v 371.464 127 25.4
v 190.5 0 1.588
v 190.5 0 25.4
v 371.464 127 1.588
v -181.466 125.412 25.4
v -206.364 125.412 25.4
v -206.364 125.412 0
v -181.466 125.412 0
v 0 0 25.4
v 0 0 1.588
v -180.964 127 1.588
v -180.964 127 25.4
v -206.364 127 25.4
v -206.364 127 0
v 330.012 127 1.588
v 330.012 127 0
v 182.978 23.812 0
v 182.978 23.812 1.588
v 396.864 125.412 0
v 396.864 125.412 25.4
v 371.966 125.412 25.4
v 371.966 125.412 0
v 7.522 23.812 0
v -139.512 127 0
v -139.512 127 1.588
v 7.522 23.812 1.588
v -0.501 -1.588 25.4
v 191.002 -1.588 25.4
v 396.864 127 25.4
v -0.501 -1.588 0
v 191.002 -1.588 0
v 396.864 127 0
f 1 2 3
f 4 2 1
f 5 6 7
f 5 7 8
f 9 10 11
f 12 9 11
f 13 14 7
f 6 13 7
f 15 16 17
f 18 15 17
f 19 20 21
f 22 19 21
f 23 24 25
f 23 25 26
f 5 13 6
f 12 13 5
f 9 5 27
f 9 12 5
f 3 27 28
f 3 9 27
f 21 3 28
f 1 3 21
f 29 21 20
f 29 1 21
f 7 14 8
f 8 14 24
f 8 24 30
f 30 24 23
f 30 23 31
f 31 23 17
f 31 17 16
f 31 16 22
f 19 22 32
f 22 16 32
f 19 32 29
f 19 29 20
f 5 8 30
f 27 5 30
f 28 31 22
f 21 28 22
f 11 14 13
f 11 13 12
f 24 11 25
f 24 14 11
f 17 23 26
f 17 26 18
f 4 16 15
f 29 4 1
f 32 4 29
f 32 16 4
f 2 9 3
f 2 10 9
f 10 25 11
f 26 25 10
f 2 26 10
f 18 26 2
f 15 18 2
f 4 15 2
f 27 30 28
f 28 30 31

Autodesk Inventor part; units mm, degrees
ref_plane "YZ Plane" through (0, 0, 0) normal (1, 0, 0) x (0, 1, 0)
ref_plane "XZ Plane" through (0, 0, 0) normal (0, 1, 0) x (-1, 0, 0)
ref_plane "XY Plane" through (0, 0, 0) normal (0, 0, 1) x (1, 0, 0)
sketch "Sketch1" plane through (0, 0, 0) normal (0, 0, 1) x (1, 0, 0)
  line L0 (0, 0) -> (190.5, 0)
  line L1 (7.522, 23.8125) -> (182.978, 23.8125)
  line L2 (0, 0) -> (-180.9643, 127)
  line L3 (190.5, 0) -> (371.4643, 127)
  line L4 (-139.5115, 127) -> (7.522, 23.8125)
  line L5 (330.0115, 127) -> (182.978, 23.8125)
  line L6 (-180.9643, 127) -> (-139.5115, 127)
  line L7 (330.0115, 127) -> (371.4643, 127)
  line L8 (-181.4658, 125.4125) -> (-0.5015, -1.5875)
  line L9 (-0.5015, -1.5875) -> (191.0015, -1.5875)
  line L10 (191.0015, -1.5875) -> (371.9658, 125.4125)
  line L11 (-180.9643, 127) -> (-206.3643, 127)
  line L12 (-206.3643, 127) -> (-206.3643, 125.4125)
  line L13 (-206.3643, 125.4125) -> (-181.4658, 125.4125)
  line L14 (371.4643, 127) -> (396.8643, 127)
  line L15 (396.8643, 127) -> (396.8643, 125.4125)
  line L16 (396.8643, 125.4125) -> (371.9658, 125.4125)
  dimension "d0" = 190.5
  dimension "d1" = 23.8125
  dimension "d2" = 23.8125
  dimension "d3" = 23.8125
  dimension "d4" = 144.939
  dimension "d5" = 144.939
  dimension "d6" = 221.0816
  dimension "d7" = 221.0816
  dimension "d8" = 127
  dimension "d9" = 1.5875
  dimension "d10" = 25.4
  dimension "d11" = 1.5875
  dimension "d12" = 25.4
  dimension "d13" = 1.5875
extrude "Extrusion1" add sketch "Sketch1" along normal blind 1.5875 contours L2 L6 L4 L1 L5 L7 L3 L0
extrude "Extrusion2" add sketch "Sketch1" along normal blind 25.4 contours L0 L3 L14 L15 L16 L10 L9 L8 L13 L12 L11 L2
equation "\"d2\" = d1"
equation "\"d3\" = d1"
equation "\"d4\" = d5"
equation "\"d7\" = d6"
properties part number "battery front L"
